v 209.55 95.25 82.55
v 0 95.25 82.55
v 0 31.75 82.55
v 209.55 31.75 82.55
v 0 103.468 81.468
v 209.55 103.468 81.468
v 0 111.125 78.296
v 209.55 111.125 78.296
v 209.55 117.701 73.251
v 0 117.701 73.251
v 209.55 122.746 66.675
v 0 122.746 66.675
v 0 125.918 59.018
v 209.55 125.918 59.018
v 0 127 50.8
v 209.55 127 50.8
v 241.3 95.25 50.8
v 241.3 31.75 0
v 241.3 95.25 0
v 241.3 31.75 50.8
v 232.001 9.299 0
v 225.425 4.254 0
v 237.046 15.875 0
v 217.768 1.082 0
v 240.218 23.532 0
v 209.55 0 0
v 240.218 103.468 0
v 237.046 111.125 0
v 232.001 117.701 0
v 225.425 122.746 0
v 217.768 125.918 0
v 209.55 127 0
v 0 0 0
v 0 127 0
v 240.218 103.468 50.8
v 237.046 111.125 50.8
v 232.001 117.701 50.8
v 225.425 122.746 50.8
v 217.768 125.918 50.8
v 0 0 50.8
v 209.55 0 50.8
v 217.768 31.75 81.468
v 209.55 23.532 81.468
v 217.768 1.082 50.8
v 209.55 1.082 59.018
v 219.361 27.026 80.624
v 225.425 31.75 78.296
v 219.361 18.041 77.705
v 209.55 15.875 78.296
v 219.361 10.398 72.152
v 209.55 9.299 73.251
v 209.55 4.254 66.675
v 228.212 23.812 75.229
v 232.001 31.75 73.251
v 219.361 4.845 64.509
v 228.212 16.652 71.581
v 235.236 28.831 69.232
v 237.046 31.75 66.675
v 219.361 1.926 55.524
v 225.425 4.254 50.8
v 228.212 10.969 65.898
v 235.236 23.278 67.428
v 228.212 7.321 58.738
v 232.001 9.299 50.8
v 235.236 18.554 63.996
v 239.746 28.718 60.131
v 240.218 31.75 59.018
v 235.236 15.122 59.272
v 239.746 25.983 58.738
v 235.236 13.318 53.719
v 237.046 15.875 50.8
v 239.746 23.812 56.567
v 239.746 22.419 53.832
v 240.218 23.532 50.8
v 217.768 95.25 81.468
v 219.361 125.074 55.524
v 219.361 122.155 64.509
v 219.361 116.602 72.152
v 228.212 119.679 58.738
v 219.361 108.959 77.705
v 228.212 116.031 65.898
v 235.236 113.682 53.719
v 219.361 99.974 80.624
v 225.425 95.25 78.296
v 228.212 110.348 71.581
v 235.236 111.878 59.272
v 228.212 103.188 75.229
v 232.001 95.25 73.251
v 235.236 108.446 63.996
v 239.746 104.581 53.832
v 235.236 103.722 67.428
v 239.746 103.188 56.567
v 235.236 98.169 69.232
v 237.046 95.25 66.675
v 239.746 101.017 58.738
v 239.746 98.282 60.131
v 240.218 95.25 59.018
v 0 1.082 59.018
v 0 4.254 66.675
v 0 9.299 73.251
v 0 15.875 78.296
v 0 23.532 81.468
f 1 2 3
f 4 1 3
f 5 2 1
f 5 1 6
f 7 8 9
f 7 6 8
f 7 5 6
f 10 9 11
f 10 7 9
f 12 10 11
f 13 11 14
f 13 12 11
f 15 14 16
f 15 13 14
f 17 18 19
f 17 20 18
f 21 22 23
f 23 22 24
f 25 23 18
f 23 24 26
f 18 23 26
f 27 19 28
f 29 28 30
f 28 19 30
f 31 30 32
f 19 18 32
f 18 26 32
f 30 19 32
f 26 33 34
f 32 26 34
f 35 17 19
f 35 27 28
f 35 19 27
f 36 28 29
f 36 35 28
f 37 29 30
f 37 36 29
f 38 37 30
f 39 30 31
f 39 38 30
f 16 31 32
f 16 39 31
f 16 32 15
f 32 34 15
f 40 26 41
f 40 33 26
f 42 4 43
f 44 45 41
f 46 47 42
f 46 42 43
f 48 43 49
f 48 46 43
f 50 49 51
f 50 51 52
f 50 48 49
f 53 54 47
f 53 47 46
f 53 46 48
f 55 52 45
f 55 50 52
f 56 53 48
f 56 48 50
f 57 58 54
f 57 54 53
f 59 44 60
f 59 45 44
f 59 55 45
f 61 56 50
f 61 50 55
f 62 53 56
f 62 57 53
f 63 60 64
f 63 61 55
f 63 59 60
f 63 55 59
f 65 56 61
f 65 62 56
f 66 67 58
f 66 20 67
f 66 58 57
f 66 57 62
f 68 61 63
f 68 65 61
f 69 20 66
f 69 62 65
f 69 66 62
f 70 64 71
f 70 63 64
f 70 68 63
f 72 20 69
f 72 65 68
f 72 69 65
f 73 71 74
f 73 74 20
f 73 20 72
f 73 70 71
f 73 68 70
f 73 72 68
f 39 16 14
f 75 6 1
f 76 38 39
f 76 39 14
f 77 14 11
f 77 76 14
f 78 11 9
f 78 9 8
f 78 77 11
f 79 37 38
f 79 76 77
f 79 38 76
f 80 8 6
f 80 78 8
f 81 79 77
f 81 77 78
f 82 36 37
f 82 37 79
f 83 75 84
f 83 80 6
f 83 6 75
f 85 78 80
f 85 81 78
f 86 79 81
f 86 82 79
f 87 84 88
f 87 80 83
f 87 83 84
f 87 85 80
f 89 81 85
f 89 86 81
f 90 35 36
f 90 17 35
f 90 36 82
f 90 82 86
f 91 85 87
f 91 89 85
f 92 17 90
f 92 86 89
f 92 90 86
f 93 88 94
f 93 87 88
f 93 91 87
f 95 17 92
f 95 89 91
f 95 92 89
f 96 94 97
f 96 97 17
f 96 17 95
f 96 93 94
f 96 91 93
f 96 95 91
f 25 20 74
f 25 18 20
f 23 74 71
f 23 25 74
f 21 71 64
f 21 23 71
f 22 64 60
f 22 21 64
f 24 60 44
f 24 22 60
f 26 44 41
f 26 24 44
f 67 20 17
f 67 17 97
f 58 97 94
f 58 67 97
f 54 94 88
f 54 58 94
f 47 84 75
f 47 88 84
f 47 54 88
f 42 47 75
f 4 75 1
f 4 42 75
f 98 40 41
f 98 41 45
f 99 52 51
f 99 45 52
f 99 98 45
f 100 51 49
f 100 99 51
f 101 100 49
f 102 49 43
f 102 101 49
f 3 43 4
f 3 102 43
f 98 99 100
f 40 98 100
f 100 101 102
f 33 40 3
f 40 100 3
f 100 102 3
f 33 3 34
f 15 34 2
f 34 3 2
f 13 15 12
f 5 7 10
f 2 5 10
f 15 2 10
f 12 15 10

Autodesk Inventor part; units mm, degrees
ref_plane "YZ Plane" through (0, 0, 0) normal (1, 0, 0) x (0, 1, 0)
ref_plane "XZ Plane" through (0, 0, 0) normal (0, 1, 0) x (-1, 0, 0)
ref_plane "XY Plane" through (0, 0, 0) normal (0, 0, 1) x (1, 0, 0)
sketch "Sketch1" plane through (0, 0, 0) normal (1, 0, 0) x (0, 1, 0)
  line L0 (0, 0) -> (127, 0)
  line L1 (127, 0) -> (127, 50.8)
  line L2 (0, 0) -> (0, 50.8)
  arc A0 (95.25, 82.55) -> (127, 50.8) centre (95.25, 50.8) ccw construction
  arc A1 (31.75, 82.55) -> (0, 50.8) centre (31.75, 50.8) ccw
  line L3 (95.25, 82.55) -> (31.75, 82.55)
  arc A2 (127, 50.8) -> (95.25, 82.55) centre (95.25, 50.8) ccw
  line L4 (127, 19.05) -> (0, 19.05) construction
  dimension "d0" = 127
  dimension "d1" = 63.5
  dimension "d2" = 19.05
extrude "Extrusion1" add sketch "Sketch1" along normal blind 241.3
fillet "Fillet1" radius 31.75 5 edges at (241.3, 117.7006, 73.2506) (241.3, 63.5, 82.55) (241.3, 9.2994, 73.2506) (241.3, 0, 25.4) (241.3, 127, 25.4)
properties part number "Front Bumper"
